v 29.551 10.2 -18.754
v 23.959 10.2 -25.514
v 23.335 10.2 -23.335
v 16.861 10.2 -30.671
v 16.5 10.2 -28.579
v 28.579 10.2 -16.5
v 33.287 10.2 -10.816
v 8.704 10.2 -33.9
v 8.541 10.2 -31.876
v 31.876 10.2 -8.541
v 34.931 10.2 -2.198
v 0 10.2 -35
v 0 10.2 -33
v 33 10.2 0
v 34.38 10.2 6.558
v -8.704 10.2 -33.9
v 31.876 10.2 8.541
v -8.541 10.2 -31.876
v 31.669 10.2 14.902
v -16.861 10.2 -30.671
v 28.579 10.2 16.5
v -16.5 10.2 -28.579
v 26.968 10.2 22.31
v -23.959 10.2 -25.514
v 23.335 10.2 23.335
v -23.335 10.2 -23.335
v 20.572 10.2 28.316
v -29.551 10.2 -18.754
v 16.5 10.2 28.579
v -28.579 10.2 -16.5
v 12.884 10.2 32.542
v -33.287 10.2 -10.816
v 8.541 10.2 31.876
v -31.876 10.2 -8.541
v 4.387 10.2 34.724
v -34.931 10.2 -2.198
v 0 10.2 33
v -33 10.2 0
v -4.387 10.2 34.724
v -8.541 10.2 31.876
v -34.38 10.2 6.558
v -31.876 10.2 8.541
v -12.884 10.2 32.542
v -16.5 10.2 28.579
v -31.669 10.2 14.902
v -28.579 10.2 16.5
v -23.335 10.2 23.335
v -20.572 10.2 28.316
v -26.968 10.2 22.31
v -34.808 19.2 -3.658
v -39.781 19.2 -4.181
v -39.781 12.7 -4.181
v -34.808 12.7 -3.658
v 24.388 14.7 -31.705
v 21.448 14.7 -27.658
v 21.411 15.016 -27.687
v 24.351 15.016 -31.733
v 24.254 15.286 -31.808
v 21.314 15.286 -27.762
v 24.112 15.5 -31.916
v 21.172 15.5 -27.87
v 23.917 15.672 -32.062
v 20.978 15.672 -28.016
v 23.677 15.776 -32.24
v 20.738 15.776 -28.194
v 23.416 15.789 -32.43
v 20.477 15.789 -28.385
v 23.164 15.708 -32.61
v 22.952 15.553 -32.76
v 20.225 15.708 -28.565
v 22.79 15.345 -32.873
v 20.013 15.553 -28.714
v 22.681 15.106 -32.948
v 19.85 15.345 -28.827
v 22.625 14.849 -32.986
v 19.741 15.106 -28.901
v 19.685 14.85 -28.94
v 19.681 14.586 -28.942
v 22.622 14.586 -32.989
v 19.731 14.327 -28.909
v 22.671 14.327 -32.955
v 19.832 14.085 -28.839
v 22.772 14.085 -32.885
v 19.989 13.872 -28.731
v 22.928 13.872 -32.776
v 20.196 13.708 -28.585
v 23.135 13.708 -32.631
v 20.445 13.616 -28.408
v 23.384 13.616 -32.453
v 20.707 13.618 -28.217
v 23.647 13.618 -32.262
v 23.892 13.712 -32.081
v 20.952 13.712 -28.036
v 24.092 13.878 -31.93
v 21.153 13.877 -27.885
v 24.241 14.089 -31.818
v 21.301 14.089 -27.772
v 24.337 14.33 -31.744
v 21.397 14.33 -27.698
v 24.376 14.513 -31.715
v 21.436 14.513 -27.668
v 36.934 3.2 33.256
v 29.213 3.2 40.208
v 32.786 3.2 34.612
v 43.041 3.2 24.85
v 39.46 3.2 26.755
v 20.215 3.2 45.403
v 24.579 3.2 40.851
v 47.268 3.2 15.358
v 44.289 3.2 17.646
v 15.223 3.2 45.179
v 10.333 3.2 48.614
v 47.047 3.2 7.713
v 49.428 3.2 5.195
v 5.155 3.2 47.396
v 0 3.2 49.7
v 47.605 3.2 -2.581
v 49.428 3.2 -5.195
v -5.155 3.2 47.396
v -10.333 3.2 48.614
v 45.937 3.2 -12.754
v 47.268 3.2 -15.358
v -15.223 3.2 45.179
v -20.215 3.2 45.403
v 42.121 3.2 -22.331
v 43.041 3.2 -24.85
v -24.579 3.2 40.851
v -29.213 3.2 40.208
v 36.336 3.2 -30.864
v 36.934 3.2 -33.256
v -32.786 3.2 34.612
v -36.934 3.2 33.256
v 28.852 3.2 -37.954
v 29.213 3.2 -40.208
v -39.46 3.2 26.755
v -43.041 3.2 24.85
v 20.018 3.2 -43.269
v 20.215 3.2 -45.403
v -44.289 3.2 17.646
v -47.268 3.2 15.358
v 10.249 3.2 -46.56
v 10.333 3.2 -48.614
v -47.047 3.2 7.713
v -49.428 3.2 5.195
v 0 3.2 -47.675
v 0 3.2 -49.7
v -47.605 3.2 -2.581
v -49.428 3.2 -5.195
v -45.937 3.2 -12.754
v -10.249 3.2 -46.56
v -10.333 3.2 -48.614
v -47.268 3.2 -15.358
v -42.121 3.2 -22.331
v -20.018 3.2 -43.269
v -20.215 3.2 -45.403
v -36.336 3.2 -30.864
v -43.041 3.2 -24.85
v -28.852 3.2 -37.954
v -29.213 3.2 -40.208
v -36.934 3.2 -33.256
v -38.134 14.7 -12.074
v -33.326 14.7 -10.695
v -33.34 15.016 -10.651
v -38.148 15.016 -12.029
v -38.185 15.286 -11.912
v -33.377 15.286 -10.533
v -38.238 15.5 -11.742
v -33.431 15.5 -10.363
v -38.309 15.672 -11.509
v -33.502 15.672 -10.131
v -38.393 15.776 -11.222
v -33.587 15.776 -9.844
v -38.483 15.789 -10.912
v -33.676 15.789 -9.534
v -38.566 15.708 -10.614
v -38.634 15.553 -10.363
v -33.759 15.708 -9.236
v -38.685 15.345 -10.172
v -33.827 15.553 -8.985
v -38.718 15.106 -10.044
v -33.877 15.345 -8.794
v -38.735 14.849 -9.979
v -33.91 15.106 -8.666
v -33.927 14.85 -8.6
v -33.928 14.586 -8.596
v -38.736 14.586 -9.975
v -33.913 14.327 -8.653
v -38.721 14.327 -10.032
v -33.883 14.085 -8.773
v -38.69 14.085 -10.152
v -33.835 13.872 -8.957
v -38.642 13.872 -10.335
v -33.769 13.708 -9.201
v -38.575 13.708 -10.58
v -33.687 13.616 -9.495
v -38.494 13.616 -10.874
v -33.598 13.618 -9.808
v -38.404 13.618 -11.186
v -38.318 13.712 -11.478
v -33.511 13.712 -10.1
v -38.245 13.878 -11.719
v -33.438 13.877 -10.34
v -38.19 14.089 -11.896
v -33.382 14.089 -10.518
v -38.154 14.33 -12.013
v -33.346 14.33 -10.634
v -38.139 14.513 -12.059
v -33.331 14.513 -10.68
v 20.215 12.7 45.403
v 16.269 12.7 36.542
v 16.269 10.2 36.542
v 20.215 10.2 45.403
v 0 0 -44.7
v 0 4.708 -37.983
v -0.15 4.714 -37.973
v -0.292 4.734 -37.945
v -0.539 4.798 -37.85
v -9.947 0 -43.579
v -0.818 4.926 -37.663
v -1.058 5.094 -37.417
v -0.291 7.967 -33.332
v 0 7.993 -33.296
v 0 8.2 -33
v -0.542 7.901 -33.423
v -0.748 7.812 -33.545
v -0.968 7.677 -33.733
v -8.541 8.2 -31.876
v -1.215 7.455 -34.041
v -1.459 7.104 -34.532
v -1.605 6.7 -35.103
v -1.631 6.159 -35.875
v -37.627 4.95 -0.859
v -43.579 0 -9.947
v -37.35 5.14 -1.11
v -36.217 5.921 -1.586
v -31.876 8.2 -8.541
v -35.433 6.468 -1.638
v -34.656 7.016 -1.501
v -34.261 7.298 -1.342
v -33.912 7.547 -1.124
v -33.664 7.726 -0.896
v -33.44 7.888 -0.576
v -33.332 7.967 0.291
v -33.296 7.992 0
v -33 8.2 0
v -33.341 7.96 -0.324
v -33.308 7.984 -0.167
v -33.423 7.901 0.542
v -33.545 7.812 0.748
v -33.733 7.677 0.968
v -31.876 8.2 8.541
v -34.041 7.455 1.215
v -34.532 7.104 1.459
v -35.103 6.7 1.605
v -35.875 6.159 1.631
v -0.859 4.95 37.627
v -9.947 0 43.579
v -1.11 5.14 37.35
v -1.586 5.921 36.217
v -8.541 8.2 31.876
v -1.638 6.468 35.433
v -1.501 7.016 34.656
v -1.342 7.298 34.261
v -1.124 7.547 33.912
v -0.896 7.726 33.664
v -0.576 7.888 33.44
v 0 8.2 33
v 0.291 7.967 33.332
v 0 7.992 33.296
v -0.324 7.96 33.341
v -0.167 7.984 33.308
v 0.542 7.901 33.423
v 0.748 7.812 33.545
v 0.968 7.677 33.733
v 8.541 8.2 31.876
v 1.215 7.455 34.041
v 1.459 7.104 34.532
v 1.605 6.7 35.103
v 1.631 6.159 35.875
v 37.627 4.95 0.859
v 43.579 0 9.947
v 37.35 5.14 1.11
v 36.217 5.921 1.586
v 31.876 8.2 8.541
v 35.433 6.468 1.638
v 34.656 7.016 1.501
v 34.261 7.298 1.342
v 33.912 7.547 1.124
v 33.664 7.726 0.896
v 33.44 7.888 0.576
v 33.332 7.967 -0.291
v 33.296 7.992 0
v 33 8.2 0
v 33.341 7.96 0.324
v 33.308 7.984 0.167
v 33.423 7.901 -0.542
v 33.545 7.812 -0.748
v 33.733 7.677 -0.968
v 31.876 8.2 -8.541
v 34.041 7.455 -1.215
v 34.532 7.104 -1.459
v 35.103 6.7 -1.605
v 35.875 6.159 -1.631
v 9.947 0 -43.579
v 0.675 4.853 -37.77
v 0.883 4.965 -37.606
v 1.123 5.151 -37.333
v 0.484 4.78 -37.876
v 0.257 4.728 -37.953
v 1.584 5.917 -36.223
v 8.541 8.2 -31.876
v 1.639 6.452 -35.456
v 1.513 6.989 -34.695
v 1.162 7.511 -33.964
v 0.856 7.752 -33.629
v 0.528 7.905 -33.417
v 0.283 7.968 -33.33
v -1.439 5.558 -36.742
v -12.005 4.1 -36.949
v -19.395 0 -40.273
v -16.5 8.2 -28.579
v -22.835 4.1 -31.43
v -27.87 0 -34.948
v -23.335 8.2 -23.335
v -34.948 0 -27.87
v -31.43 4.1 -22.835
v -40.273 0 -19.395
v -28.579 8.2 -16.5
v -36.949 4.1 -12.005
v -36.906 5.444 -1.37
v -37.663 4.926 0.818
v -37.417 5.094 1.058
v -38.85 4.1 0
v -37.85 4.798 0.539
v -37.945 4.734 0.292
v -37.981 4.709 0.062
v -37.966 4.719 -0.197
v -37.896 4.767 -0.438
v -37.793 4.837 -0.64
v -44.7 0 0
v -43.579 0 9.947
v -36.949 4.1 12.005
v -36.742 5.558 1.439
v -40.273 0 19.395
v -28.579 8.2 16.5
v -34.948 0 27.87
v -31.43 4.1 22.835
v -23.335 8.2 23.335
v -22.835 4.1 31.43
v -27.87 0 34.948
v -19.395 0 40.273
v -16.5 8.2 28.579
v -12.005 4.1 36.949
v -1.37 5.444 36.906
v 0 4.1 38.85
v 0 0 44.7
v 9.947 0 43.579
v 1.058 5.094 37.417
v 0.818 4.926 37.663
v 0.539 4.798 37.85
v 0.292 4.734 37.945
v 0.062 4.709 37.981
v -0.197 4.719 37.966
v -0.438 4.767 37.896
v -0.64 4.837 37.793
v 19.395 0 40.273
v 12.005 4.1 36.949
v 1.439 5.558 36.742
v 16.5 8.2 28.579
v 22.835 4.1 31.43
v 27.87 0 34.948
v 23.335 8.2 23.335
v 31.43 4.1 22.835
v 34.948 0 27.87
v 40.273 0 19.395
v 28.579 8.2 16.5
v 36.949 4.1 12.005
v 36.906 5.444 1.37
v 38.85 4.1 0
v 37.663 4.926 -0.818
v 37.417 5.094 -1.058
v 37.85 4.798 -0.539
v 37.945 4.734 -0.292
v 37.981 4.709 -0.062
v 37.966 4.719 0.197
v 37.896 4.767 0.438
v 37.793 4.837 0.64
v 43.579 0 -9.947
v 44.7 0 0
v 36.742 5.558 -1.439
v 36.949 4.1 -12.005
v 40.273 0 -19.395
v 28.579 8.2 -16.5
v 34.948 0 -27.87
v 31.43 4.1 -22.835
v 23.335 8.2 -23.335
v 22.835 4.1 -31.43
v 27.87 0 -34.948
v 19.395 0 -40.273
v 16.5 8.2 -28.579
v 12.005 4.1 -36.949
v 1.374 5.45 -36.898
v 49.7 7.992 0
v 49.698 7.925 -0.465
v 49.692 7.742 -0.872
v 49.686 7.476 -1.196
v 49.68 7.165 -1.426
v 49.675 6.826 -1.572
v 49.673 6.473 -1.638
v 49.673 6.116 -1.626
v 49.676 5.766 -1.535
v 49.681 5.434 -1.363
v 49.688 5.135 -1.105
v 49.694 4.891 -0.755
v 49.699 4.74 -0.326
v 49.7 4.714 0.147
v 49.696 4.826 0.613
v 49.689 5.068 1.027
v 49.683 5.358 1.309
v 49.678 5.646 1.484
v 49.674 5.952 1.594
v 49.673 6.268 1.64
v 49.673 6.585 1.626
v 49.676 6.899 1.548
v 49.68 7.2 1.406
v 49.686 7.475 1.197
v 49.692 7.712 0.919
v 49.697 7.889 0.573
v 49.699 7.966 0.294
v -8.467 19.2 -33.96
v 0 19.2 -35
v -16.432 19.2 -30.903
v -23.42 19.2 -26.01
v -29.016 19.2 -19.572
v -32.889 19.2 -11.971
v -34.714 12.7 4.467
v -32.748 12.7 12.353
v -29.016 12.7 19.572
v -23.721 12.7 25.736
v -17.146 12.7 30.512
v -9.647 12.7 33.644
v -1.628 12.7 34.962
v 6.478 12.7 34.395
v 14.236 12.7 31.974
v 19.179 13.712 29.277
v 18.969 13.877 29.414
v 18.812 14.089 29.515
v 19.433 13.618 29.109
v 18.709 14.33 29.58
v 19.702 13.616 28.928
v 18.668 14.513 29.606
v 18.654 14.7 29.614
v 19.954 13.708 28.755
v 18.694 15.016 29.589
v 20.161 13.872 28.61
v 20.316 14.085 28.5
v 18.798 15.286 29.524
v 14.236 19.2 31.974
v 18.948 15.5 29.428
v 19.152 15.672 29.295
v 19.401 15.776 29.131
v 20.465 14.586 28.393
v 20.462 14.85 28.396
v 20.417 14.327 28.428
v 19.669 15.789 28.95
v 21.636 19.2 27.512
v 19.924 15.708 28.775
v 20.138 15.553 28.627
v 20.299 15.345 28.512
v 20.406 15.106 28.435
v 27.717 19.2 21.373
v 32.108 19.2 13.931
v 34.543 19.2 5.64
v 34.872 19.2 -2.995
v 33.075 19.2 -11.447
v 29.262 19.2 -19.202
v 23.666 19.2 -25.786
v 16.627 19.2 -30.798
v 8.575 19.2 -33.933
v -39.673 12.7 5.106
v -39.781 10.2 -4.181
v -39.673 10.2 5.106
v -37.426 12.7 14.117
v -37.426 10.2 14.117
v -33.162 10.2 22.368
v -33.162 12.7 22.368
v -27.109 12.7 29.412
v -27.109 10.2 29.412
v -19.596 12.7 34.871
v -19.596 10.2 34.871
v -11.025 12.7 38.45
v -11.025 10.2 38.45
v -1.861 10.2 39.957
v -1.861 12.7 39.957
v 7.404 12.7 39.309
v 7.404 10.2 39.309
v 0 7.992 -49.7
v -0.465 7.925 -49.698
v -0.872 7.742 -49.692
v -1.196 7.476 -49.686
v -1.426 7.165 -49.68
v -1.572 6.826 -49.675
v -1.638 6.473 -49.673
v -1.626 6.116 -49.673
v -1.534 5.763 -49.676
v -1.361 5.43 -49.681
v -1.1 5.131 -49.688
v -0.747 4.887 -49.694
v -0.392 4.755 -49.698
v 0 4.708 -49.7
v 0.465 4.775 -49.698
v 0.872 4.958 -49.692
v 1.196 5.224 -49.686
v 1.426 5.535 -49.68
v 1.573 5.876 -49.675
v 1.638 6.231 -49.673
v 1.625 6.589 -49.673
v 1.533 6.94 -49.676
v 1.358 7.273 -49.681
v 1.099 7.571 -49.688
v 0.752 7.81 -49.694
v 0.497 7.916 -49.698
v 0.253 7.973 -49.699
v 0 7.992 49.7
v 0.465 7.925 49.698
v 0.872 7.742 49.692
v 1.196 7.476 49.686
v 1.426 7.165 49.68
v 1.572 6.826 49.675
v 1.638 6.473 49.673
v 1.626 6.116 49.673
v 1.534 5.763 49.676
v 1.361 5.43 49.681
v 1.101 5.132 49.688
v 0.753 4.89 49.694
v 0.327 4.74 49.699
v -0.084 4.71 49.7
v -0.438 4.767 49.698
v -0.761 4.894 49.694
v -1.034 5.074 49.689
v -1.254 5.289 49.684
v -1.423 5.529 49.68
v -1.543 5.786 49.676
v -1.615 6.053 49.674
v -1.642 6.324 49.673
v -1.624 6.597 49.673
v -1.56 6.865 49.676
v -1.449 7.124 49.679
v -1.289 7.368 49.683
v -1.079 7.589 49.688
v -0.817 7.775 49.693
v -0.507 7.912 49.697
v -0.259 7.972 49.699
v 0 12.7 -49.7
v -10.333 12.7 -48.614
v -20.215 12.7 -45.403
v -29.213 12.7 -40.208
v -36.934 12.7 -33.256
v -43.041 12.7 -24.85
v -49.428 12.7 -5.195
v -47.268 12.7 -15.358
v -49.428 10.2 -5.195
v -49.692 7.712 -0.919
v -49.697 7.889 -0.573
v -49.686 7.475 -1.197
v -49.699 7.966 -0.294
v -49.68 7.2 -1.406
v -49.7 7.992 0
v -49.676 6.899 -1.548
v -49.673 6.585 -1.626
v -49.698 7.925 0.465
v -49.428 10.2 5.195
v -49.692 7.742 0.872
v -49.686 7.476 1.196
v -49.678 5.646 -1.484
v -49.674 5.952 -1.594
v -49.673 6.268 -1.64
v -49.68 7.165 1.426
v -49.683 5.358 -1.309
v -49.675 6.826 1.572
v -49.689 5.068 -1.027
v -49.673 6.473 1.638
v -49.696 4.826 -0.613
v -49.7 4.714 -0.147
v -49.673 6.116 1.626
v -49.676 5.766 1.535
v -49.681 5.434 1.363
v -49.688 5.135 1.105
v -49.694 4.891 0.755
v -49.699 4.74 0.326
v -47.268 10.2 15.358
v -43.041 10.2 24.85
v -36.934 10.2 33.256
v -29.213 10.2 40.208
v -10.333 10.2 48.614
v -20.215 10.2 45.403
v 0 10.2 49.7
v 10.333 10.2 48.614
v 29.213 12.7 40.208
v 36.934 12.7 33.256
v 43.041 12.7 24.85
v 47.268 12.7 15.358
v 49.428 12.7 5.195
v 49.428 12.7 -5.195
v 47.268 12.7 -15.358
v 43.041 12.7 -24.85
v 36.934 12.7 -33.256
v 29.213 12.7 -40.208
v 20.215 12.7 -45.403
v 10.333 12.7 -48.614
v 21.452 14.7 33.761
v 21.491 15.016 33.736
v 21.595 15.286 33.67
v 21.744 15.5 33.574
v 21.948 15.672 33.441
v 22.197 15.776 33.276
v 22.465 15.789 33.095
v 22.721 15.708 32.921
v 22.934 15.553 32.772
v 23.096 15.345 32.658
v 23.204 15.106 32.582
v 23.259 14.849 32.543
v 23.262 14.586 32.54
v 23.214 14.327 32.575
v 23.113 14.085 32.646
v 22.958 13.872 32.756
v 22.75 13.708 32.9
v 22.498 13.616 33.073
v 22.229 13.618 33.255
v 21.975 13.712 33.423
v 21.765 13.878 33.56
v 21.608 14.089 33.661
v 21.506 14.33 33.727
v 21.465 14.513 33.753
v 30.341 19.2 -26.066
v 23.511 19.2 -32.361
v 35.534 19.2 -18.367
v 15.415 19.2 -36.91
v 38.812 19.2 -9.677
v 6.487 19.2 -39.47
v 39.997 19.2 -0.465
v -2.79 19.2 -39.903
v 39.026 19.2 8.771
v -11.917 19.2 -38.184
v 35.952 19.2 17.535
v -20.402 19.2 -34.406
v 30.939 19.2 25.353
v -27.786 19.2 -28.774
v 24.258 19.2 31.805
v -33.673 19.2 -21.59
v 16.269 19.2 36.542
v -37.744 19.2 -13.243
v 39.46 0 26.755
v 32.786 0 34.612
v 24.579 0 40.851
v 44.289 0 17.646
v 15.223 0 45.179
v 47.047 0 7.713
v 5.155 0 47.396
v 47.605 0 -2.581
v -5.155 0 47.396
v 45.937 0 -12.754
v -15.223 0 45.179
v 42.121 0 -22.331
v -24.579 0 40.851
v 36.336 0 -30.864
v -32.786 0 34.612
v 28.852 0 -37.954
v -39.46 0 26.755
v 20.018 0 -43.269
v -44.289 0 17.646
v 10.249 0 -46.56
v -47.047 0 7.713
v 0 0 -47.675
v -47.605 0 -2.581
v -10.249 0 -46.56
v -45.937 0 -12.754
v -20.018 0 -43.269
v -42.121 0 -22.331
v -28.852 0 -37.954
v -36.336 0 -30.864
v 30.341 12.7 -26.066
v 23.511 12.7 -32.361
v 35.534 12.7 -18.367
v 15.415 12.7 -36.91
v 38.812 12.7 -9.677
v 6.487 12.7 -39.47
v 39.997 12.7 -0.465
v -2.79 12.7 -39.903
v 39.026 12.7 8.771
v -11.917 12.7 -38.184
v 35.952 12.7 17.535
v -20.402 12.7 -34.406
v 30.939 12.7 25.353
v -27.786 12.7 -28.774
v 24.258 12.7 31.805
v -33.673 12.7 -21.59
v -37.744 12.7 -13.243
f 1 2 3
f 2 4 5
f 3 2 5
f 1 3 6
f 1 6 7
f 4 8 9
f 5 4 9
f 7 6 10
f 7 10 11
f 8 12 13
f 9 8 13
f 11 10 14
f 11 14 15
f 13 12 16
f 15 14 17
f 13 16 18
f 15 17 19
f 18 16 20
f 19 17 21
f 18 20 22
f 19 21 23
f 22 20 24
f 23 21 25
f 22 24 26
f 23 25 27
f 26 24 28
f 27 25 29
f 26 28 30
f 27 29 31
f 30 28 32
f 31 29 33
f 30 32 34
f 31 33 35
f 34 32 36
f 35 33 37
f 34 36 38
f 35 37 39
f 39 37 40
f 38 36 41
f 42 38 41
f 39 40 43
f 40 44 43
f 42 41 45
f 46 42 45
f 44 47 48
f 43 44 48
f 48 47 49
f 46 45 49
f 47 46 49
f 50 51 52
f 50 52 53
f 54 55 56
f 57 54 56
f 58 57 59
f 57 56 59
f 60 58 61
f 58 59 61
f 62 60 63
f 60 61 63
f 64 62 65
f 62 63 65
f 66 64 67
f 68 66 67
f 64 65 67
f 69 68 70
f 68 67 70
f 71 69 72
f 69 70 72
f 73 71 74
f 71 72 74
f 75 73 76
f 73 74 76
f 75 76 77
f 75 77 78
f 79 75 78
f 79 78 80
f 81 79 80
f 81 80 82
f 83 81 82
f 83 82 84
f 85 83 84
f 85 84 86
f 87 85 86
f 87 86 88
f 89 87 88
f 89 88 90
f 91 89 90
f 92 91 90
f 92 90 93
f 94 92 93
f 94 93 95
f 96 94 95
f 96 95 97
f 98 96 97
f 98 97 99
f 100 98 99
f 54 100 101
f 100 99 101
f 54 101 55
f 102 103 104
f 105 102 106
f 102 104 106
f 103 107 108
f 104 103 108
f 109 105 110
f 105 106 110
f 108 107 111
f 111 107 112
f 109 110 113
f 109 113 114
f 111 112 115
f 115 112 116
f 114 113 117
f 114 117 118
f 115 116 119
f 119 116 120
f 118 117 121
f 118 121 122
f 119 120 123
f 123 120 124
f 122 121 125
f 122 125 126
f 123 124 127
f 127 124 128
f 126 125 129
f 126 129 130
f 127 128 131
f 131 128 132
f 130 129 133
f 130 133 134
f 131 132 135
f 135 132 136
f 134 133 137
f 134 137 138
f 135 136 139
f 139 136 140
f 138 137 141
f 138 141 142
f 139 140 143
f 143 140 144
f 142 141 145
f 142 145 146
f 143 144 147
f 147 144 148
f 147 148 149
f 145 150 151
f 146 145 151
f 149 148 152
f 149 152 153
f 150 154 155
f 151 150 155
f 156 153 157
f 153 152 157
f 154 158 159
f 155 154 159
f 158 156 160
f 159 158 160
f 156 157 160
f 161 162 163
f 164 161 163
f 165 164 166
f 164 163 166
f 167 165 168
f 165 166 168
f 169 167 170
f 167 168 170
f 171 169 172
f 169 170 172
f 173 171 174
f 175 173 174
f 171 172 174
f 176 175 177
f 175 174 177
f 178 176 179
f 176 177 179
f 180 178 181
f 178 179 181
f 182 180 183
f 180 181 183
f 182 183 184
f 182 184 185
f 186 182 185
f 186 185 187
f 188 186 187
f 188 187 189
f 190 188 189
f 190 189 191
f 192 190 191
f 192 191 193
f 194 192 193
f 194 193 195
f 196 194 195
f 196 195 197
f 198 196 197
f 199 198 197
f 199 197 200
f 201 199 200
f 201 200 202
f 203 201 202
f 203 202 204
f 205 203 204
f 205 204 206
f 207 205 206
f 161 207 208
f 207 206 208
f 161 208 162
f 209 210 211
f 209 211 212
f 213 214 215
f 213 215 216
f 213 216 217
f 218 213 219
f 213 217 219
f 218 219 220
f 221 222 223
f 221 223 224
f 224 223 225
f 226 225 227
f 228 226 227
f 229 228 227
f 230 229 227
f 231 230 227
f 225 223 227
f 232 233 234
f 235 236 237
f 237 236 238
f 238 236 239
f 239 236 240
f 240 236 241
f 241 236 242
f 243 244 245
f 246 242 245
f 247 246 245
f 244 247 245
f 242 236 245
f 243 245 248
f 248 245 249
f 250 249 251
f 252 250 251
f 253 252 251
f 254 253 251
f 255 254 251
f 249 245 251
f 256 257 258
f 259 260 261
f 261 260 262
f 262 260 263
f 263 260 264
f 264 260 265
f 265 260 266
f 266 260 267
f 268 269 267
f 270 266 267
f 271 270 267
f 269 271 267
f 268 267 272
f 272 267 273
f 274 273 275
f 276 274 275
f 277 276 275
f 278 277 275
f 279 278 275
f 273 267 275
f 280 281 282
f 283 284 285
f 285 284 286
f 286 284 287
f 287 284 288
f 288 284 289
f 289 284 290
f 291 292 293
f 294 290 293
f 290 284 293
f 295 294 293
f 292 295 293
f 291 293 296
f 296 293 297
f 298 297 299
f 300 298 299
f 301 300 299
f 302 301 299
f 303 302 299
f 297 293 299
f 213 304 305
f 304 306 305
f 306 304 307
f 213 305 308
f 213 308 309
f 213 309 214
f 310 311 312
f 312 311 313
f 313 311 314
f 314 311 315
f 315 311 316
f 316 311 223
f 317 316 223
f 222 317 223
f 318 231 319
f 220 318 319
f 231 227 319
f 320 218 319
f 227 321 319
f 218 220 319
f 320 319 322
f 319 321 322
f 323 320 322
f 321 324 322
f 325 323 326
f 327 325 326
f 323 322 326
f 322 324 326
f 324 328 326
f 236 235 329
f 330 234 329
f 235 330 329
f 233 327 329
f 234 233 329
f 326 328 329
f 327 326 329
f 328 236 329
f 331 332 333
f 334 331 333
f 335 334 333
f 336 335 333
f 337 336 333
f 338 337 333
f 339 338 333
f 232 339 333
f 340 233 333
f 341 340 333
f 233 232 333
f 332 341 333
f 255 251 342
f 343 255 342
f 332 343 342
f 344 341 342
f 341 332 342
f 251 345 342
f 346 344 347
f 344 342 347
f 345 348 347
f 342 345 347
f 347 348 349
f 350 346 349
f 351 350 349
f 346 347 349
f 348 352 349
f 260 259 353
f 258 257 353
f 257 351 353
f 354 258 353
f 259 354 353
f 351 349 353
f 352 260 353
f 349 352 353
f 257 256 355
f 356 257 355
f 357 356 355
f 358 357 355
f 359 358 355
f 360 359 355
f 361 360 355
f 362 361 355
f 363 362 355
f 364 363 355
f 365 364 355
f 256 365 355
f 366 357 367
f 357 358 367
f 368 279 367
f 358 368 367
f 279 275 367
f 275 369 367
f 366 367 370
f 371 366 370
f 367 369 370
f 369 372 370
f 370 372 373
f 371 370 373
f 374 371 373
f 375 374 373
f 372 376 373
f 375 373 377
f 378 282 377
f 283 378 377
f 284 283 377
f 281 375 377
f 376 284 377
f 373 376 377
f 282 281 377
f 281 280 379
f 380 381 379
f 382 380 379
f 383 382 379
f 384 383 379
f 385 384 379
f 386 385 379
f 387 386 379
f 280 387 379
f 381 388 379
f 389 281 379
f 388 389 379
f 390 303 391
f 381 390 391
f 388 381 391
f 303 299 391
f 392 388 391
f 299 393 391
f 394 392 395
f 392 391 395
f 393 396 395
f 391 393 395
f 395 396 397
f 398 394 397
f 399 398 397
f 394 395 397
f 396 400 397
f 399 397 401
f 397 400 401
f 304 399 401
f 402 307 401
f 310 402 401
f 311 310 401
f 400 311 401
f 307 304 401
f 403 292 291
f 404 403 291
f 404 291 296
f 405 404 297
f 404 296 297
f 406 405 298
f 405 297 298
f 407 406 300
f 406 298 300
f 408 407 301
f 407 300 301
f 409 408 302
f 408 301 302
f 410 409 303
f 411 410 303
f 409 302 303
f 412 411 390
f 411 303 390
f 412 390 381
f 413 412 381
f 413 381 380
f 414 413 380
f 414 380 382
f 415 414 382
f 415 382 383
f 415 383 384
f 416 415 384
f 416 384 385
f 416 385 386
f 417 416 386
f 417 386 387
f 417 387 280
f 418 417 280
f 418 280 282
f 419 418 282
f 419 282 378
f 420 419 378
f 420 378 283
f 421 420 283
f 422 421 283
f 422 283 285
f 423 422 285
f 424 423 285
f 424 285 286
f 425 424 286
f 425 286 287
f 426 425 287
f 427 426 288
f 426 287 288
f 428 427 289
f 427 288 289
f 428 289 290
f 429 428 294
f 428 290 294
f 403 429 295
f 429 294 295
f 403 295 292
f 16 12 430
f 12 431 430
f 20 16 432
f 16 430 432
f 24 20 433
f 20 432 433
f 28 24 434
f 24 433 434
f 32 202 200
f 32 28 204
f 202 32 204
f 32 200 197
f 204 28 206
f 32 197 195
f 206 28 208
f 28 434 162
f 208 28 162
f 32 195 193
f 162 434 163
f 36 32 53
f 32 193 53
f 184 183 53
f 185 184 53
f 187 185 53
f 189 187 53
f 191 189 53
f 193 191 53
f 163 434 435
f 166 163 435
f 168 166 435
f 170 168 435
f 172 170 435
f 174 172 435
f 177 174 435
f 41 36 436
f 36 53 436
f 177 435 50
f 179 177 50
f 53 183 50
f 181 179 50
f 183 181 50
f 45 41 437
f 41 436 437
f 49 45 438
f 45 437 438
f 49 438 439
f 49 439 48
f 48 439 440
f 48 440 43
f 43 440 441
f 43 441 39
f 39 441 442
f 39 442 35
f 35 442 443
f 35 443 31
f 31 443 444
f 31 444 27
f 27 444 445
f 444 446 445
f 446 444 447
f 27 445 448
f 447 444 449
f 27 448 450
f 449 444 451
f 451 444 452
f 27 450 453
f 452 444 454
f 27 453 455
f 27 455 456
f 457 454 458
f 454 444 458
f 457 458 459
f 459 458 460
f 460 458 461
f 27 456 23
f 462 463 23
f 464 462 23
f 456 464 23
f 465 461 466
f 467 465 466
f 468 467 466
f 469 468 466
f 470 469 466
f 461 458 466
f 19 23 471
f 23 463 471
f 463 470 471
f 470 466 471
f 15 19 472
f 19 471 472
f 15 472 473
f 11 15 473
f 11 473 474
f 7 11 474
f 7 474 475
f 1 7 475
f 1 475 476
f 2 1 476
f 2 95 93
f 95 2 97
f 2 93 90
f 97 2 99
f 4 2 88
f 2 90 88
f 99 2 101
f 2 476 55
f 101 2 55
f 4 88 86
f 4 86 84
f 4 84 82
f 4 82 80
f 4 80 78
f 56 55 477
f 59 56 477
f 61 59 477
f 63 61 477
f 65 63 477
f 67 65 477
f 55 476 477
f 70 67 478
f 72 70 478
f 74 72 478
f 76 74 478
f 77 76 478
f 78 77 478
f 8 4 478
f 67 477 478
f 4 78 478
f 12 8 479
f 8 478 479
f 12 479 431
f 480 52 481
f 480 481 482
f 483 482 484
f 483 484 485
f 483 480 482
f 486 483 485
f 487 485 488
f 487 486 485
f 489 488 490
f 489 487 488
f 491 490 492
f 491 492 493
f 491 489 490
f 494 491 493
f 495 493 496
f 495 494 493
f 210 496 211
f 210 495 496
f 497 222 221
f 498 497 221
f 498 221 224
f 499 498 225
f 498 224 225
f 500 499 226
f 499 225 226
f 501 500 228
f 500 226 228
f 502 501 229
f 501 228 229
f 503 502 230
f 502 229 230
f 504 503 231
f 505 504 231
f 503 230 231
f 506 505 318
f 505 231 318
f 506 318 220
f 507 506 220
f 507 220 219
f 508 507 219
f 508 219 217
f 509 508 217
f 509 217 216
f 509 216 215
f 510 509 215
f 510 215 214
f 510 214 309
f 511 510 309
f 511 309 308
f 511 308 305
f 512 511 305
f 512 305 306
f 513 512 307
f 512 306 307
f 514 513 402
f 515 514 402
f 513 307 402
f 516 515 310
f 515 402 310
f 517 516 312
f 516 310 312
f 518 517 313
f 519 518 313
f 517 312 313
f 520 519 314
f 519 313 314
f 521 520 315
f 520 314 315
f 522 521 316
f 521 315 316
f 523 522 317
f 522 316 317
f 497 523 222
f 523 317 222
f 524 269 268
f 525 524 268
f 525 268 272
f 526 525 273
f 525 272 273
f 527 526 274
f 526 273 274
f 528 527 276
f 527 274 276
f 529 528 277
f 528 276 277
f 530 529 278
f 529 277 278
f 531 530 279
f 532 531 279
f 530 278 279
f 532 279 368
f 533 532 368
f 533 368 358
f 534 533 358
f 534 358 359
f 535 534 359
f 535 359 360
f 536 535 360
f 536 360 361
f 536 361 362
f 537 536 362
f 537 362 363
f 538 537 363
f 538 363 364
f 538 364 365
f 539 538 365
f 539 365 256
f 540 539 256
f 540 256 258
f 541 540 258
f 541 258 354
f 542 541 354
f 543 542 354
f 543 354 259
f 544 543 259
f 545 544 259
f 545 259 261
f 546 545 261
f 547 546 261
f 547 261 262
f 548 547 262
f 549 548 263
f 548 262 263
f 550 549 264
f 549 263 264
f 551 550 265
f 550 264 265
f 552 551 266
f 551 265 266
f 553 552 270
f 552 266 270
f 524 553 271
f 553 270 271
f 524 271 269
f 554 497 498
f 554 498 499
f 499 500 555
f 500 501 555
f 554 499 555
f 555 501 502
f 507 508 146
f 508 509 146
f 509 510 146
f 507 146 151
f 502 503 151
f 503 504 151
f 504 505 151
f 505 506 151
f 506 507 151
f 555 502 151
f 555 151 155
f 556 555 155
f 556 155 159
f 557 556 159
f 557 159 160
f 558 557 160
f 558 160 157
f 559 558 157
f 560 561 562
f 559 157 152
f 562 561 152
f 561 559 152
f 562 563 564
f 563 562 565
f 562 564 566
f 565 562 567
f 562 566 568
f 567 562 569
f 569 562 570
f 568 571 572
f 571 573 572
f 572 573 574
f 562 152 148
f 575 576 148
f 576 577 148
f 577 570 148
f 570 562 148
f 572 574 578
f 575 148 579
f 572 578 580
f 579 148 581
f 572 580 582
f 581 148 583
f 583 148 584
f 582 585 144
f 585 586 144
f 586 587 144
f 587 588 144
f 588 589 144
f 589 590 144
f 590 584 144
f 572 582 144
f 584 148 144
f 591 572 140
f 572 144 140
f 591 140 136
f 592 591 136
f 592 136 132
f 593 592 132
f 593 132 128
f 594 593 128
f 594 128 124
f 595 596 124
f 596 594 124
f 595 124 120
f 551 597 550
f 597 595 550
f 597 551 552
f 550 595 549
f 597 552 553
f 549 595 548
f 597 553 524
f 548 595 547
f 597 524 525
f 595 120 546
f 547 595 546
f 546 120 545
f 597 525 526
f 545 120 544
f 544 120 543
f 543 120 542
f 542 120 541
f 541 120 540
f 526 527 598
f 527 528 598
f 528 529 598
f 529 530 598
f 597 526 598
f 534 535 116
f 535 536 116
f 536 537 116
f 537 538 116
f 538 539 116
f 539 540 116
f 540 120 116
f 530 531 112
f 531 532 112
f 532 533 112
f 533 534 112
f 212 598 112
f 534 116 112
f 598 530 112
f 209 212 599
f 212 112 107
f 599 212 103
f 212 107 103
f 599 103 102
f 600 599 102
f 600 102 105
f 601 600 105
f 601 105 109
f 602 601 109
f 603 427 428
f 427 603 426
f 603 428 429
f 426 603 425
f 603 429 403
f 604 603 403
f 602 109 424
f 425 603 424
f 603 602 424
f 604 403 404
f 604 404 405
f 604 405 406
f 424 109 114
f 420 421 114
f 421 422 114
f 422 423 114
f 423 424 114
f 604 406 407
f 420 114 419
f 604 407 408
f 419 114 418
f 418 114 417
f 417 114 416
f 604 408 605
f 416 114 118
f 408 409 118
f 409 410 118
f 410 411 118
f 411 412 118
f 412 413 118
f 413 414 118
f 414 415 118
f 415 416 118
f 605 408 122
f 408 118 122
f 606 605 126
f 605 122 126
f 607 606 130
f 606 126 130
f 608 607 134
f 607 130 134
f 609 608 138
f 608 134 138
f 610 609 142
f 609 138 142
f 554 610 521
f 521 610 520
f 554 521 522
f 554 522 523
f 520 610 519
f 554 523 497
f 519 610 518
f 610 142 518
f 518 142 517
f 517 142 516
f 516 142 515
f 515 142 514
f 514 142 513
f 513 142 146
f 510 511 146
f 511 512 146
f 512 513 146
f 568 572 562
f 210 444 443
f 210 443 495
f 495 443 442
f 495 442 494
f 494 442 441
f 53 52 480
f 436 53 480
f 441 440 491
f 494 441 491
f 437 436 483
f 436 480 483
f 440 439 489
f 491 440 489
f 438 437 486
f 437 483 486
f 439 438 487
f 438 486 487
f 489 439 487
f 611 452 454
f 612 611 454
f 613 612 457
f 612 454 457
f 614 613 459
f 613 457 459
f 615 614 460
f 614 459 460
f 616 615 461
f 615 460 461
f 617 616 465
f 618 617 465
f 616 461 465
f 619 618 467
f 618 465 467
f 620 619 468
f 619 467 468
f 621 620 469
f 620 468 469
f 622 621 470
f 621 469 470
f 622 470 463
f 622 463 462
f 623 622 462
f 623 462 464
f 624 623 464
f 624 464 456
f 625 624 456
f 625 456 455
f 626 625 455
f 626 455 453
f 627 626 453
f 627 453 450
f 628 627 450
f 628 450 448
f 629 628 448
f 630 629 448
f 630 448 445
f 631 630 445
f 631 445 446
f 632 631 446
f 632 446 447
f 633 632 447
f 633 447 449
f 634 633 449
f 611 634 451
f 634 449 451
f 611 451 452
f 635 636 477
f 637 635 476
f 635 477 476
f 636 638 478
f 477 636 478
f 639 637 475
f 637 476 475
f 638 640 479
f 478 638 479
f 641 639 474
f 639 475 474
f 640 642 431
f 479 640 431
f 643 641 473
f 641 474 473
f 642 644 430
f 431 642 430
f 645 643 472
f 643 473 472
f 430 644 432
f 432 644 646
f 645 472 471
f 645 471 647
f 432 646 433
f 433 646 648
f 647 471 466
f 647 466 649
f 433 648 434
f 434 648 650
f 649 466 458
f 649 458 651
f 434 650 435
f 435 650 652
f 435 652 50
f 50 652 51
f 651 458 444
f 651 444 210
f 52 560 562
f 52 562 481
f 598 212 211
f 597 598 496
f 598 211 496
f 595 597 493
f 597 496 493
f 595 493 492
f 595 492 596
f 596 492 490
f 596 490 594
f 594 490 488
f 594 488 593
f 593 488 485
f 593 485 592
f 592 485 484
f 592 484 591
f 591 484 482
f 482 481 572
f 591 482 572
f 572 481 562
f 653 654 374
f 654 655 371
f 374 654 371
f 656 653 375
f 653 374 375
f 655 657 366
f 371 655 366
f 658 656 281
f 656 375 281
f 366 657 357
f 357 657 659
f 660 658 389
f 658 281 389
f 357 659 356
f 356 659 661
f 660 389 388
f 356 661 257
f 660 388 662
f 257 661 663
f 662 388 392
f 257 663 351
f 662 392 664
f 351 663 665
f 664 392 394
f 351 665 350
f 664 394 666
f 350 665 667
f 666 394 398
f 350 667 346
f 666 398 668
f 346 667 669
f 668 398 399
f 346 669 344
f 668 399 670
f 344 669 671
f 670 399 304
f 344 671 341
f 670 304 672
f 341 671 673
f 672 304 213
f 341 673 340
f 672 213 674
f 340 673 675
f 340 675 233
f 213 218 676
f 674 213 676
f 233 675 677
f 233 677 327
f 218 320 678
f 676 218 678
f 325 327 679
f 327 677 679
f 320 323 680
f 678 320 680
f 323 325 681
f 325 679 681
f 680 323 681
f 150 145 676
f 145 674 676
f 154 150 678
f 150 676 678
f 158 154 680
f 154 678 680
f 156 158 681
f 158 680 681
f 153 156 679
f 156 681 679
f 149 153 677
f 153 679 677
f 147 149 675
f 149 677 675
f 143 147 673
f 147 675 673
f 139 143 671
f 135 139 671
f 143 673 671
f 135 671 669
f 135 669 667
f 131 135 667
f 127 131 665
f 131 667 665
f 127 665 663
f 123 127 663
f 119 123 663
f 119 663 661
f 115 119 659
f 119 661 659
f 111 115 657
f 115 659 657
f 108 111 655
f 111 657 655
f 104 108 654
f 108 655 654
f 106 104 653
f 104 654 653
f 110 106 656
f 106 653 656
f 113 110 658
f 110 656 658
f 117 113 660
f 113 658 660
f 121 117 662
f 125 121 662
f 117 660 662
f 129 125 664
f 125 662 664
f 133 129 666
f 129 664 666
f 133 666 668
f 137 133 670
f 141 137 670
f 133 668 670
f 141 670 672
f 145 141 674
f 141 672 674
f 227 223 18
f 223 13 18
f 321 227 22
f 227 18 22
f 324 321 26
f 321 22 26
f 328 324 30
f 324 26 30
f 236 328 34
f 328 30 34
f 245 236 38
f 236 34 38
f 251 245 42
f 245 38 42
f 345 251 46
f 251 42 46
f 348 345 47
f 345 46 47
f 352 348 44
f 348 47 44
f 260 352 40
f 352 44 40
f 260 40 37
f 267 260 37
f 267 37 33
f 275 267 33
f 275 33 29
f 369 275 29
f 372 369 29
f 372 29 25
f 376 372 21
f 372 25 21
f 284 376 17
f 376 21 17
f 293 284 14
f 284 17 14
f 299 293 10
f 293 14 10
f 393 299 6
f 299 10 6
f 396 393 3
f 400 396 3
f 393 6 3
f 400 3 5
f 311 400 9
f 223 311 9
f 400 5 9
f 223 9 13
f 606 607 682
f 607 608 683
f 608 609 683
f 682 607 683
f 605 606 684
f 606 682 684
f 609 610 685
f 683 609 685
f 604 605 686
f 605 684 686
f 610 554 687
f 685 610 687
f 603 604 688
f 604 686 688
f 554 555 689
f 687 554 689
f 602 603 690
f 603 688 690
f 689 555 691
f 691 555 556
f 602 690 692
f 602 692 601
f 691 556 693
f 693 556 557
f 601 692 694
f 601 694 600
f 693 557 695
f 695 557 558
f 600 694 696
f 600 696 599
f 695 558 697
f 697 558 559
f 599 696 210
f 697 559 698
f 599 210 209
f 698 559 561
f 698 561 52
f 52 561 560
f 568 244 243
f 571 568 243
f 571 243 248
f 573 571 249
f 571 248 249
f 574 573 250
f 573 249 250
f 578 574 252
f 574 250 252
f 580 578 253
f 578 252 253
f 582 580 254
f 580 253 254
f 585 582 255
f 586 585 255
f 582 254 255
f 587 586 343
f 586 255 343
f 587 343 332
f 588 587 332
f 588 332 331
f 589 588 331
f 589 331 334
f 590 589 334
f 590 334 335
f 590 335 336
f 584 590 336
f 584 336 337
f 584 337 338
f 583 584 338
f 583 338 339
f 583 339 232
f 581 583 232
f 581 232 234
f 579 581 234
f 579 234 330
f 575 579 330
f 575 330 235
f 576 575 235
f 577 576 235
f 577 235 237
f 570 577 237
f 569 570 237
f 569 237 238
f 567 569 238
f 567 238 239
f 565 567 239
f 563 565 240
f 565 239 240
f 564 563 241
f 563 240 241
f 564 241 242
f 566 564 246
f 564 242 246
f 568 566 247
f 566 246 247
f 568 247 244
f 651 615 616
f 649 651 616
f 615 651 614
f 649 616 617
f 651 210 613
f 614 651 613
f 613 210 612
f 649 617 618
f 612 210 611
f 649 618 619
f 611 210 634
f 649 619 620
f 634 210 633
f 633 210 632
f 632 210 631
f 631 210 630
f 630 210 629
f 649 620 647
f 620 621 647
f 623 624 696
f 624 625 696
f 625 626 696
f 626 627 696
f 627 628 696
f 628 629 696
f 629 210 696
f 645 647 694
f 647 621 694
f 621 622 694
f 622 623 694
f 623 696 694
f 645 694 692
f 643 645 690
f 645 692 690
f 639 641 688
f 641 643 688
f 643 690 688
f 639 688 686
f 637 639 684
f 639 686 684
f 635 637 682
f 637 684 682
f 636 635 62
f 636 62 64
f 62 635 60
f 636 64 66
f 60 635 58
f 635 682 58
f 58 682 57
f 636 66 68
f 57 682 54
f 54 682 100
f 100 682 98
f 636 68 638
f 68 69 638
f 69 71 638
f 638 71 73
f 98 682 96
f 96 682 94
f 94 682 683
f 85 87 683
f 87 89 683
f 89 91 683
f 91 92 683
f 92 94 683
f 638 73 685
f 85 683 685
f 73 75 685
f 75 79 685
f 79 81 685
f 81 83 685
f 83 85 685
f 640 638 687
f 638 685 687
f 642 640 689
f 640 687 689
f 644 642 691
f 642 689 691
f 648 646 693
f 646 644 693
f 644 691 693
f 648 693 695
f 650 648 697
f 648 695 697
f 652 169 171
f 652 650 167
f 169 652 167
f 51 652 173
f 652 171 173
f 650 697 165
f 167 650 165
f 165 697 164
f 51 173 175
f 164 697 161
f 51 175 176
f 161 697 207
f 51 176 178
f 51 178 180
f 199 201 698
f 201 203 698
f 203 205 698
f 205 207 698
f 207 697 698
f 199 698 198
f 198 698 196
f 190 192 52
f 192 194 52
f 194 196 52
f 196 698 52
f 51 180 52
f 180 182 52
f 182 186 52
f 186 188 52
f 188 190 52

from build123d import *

# Parameters (mm, degrees)
SKETCH5_R          = 1.6425
CUT_EXTRUDE1_DEPTH = 50.7
SKETCH6_R          = 1.095
CUT_EXTRUDE2_DEPTH = 70.421071799
CIRPATTERN1_COUNT  = 4
CUT_EXTRUDE3_DEPTH = 6.5
CUT_EXTRUDE4_DEPTH = 2.5
CIRPATTERN2_COUNT  = 2
CIRPATTERN2_ANGLE  = 110
CIRPATTERN3_COUNT  = 2
CIRPATTERN3_ANGLE  = 110


with BuildPart() as part:
    # Sketch2 → Revolve1 (revolve)
    with BuildSketch(Plane.XY, mode=Mode.PRIVATE) as revolve1_sk:
        Polygon((49.7, 12.7), (49.7, 3.2004), (47.675, 3.2004), (47.675, 0), (44.7, 0), (33, 8.2), (33, 10.2), (35, 10.2), (35, 19.2), (40, 19.2), (40, 12.7), align=None)
    revolve(revolve1_sk.sketch.rotate(Axis((0, 0, 0), (0, 1, 0)), 90), axis=Axis((0, 0, 0), (0, 1, 0)))  # turned: the seam where the file's is

    # Sketch5 → Cut-Extrude1 (cut, through all)
    with BuildSketch(Plane.XY):
        with Locations(Location((0, 6.35, 0), (0, 0, 89.999999357))):  # turned: the seam where the file's is
            Circle(SKETCH5_R)
    cut_extrude1 = extrude(amount=-CUT_EXTRUDE1_DEPTH, mode=Mode.SUBTRACT)

    # Sketch6 → Cut-Extrude2 (cut, through all)
    with BuildSketch(Plane(origin=(0, 0, 0), x_dir=(0.809016994, 0, 0.587785252), z_dir=(-0.587785252, 0, 0.809016994))):
        with Locations((0, 14.7)):
            Circle(SKETCH6_R)
    cut_extrude2 = extrude(amount=-CUT_EXTRUDE2_DEPTH, mode=Mode.SUBTRACT)

    # CirPattern1: Cut-Extrude1 ×4 about axis
    cirpattern1_axis = Axis((0, 13.335, 0), (0, -1, 0))
    for i in range(1, CIRPATTERN1_COUNT):
        add(cut_extrude1.rotate(cirpattern1_axis, i * 360 / CIRPATTERN1_COUNT), mode=Mode.SUBTRACT)

    # Sketch7 → Cut-Extrude3 (cut)
    with BuildSketch(Plane(origin=(0, 19.2, 0), x_dir=(-1, 0, 0), z_dir=(0, 1, 0))):
        with BuildLine():
            Line((39.780875815, -4.181138531), (34.808266338, -3.658496214))
            ThreePointArc((34.808266338, -3.658496214), (20.57248383, 28.315594803), (-14.235782508, 31.974091017))
            Line((-14.235782508, 31.974091017), (-16.269465723, 36.541818306))
            ThreePointArc((-16.269465723, 36.541818306), (23.511410092, 32.360679775), (39.780875815, -4.181138531))
        make_face()
    extrude(amount=-CUT_EXTRUDE3_DEPTH, mode=Mode.SUBTRACT)

    # Sketch8 → Cut-Extrude4 (cut)
    with BuildSketch(Plane(origin=(0, 12.7, 0), x_dir=(1, 0, 0), z_dir=(0, 1, 0))):
        with BuildLine():
            Line((-49.4277382, 5.195064624), (-39.780875815, 4.181138531))
            ThreePointArc((-39.780875815, 4.181138531), (-23.511410092, -32.360679775), (16.269465723, -36.541818306))
            Line((16.269465723, -36.541818306), (20.214811161, -45.403209245))
            ThreePointArc((20.214811161, -45.403209245), (-29.212927039, -40.20814462), (-49.4277382, 5.195064624))
        make_face()
    extrude(amount=-CUT_EXTRUDE4_DEPTH, mode=Mode.SUBTRACT)

    # CirPattern2: Cut-Extrude2 ×2 about axis
    cirpattern2_axis = Axis((0, 13.335, 0), (0, -1, 0))
    for i in range(1, CIRPATTERN2_COUNT):
        add(cut_extrude2.rotate(cirpattern2_axis, i * CIRPATTERN2_ANGLE / (CIRPATTERN2_COUNT - 1)), mode=Mode.SUBTRACT)

    # CirPattern3: Cut-Extrude2 ×2 about axis
    cirpattern3_axis = Axis((0, 13.335, 0), (0, 1, 0))
    for i in range(1, CIRPATTERN3_COUNT):
        add(cut_extrude2.rotate(cirpattern3_axis, i * CIRPATTERN3_ANGLE / (CIRPATTERN3_COUNT - 1)), mode=Mode.SUBTRACT)


solid = part.part
